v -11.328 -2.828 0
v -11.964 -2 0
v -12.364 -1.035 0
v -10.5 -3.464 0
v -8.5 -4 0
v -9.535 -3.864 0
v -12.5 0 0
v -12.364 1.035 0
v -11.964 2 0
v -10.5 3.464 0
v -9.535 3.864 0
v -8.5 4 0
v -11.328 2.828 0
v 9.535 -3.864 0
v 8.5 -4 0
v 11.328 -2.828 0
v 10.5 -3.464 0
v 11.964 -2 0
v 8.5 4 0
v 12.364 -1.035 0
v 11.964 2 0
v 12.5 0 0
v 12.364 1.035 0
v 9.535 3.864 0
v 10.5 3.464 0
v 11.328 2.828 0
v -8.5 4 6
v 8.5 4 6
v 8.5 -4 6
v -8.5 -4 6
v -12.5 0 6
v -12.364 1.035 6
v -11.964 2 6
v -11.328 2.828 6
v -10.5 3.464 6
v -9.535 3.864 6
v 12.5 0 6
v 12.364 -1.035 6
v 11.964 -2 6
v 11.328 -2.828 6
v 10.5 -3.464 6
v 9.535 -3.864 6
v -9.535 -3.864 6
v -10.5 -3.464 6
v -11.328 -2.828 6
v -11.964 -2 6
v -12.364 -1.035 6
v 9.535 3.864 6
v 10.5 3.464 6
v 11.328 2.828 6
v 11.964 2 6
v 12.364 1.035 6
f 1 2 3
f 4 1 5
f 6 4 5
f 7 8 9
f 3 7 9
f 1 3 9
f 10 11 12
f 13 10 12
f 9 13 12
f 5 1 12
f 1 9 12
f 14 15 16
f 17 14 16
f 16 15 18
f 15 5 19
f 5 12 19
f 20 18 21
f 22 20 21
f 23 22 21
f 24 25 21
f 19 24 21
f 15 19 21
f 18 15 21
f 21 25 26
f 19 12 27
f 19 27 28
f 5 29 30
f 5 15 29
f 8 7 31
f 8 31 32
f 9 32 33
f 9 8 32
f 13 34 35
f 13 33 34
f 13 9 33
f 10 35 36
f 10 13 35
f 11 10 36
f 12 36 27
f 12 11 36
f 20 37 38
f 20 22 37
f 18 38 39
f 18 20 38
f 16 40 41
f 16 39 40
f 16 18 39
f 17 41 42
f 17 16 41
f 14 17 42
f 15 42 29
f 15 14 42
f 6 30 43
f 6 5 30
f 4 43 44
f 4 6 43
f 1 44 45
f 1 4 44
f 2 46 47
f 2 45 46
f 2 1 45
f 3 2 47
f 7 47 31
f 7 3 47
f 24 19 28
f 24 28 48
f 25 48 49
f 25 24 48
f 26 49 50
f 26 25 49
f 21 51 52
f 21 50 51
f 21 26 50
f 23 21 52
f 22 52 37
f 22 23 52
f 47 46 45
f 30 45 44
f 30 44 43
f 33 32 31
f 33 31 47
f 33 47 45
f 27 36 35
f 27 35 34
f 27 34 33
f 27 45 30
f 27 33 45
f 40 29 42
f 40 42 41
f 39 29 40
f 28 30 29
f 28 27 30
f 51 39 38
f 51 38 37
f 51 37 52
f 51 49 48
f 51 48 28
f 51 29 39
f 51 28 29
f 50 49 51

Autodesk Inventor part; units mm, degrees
ref_plane "YZ Plane" through (0, 0, 0) normal (1, 0, 0) x (0, 1, 0)
ref_plane "XZ Plane" through (0, 0, 0) normal (0, 1, 0) x (-1, 0, 0)
ref_plane "XY Plane" through (0, 0, 0) normal (0, 0, 1) x (1, 0, 0)
sketch "Boceto1" plane through (0, 0, 0) normal (0, 0, 1) x (1, 0, 0)
  line L0 (8.5, -4) -> (-8.5, -4)
  line L1 (-12.5, -4) -> (-12.5, 4)
  line L2 (-8.5, 4) -> (8.5, 4)
  line L3 (12.5, 4) -> (12.5, -4)
  line L4 (-12.5, 0) -> (-8.5, 0)
  arc A0 (-8.5, 4) -> (-8.5, -4) centre (-8.5, 0) ccw
  line L5 (12.5, 0) -> (8.5, 0)
  arc A1 (8.5, -4) -> (8.5, 4) centre (8.5, 0) ccw
  point P0 (0, 0)
  dimension "d6" = 25
  dimension "d7" = 8
  dimension "d8" = 4
  dimension "d9" = 4
extrude "Extrusión2" add sketch "Boceto1" along normal blind 6
properties part number "Chaveta 25"
